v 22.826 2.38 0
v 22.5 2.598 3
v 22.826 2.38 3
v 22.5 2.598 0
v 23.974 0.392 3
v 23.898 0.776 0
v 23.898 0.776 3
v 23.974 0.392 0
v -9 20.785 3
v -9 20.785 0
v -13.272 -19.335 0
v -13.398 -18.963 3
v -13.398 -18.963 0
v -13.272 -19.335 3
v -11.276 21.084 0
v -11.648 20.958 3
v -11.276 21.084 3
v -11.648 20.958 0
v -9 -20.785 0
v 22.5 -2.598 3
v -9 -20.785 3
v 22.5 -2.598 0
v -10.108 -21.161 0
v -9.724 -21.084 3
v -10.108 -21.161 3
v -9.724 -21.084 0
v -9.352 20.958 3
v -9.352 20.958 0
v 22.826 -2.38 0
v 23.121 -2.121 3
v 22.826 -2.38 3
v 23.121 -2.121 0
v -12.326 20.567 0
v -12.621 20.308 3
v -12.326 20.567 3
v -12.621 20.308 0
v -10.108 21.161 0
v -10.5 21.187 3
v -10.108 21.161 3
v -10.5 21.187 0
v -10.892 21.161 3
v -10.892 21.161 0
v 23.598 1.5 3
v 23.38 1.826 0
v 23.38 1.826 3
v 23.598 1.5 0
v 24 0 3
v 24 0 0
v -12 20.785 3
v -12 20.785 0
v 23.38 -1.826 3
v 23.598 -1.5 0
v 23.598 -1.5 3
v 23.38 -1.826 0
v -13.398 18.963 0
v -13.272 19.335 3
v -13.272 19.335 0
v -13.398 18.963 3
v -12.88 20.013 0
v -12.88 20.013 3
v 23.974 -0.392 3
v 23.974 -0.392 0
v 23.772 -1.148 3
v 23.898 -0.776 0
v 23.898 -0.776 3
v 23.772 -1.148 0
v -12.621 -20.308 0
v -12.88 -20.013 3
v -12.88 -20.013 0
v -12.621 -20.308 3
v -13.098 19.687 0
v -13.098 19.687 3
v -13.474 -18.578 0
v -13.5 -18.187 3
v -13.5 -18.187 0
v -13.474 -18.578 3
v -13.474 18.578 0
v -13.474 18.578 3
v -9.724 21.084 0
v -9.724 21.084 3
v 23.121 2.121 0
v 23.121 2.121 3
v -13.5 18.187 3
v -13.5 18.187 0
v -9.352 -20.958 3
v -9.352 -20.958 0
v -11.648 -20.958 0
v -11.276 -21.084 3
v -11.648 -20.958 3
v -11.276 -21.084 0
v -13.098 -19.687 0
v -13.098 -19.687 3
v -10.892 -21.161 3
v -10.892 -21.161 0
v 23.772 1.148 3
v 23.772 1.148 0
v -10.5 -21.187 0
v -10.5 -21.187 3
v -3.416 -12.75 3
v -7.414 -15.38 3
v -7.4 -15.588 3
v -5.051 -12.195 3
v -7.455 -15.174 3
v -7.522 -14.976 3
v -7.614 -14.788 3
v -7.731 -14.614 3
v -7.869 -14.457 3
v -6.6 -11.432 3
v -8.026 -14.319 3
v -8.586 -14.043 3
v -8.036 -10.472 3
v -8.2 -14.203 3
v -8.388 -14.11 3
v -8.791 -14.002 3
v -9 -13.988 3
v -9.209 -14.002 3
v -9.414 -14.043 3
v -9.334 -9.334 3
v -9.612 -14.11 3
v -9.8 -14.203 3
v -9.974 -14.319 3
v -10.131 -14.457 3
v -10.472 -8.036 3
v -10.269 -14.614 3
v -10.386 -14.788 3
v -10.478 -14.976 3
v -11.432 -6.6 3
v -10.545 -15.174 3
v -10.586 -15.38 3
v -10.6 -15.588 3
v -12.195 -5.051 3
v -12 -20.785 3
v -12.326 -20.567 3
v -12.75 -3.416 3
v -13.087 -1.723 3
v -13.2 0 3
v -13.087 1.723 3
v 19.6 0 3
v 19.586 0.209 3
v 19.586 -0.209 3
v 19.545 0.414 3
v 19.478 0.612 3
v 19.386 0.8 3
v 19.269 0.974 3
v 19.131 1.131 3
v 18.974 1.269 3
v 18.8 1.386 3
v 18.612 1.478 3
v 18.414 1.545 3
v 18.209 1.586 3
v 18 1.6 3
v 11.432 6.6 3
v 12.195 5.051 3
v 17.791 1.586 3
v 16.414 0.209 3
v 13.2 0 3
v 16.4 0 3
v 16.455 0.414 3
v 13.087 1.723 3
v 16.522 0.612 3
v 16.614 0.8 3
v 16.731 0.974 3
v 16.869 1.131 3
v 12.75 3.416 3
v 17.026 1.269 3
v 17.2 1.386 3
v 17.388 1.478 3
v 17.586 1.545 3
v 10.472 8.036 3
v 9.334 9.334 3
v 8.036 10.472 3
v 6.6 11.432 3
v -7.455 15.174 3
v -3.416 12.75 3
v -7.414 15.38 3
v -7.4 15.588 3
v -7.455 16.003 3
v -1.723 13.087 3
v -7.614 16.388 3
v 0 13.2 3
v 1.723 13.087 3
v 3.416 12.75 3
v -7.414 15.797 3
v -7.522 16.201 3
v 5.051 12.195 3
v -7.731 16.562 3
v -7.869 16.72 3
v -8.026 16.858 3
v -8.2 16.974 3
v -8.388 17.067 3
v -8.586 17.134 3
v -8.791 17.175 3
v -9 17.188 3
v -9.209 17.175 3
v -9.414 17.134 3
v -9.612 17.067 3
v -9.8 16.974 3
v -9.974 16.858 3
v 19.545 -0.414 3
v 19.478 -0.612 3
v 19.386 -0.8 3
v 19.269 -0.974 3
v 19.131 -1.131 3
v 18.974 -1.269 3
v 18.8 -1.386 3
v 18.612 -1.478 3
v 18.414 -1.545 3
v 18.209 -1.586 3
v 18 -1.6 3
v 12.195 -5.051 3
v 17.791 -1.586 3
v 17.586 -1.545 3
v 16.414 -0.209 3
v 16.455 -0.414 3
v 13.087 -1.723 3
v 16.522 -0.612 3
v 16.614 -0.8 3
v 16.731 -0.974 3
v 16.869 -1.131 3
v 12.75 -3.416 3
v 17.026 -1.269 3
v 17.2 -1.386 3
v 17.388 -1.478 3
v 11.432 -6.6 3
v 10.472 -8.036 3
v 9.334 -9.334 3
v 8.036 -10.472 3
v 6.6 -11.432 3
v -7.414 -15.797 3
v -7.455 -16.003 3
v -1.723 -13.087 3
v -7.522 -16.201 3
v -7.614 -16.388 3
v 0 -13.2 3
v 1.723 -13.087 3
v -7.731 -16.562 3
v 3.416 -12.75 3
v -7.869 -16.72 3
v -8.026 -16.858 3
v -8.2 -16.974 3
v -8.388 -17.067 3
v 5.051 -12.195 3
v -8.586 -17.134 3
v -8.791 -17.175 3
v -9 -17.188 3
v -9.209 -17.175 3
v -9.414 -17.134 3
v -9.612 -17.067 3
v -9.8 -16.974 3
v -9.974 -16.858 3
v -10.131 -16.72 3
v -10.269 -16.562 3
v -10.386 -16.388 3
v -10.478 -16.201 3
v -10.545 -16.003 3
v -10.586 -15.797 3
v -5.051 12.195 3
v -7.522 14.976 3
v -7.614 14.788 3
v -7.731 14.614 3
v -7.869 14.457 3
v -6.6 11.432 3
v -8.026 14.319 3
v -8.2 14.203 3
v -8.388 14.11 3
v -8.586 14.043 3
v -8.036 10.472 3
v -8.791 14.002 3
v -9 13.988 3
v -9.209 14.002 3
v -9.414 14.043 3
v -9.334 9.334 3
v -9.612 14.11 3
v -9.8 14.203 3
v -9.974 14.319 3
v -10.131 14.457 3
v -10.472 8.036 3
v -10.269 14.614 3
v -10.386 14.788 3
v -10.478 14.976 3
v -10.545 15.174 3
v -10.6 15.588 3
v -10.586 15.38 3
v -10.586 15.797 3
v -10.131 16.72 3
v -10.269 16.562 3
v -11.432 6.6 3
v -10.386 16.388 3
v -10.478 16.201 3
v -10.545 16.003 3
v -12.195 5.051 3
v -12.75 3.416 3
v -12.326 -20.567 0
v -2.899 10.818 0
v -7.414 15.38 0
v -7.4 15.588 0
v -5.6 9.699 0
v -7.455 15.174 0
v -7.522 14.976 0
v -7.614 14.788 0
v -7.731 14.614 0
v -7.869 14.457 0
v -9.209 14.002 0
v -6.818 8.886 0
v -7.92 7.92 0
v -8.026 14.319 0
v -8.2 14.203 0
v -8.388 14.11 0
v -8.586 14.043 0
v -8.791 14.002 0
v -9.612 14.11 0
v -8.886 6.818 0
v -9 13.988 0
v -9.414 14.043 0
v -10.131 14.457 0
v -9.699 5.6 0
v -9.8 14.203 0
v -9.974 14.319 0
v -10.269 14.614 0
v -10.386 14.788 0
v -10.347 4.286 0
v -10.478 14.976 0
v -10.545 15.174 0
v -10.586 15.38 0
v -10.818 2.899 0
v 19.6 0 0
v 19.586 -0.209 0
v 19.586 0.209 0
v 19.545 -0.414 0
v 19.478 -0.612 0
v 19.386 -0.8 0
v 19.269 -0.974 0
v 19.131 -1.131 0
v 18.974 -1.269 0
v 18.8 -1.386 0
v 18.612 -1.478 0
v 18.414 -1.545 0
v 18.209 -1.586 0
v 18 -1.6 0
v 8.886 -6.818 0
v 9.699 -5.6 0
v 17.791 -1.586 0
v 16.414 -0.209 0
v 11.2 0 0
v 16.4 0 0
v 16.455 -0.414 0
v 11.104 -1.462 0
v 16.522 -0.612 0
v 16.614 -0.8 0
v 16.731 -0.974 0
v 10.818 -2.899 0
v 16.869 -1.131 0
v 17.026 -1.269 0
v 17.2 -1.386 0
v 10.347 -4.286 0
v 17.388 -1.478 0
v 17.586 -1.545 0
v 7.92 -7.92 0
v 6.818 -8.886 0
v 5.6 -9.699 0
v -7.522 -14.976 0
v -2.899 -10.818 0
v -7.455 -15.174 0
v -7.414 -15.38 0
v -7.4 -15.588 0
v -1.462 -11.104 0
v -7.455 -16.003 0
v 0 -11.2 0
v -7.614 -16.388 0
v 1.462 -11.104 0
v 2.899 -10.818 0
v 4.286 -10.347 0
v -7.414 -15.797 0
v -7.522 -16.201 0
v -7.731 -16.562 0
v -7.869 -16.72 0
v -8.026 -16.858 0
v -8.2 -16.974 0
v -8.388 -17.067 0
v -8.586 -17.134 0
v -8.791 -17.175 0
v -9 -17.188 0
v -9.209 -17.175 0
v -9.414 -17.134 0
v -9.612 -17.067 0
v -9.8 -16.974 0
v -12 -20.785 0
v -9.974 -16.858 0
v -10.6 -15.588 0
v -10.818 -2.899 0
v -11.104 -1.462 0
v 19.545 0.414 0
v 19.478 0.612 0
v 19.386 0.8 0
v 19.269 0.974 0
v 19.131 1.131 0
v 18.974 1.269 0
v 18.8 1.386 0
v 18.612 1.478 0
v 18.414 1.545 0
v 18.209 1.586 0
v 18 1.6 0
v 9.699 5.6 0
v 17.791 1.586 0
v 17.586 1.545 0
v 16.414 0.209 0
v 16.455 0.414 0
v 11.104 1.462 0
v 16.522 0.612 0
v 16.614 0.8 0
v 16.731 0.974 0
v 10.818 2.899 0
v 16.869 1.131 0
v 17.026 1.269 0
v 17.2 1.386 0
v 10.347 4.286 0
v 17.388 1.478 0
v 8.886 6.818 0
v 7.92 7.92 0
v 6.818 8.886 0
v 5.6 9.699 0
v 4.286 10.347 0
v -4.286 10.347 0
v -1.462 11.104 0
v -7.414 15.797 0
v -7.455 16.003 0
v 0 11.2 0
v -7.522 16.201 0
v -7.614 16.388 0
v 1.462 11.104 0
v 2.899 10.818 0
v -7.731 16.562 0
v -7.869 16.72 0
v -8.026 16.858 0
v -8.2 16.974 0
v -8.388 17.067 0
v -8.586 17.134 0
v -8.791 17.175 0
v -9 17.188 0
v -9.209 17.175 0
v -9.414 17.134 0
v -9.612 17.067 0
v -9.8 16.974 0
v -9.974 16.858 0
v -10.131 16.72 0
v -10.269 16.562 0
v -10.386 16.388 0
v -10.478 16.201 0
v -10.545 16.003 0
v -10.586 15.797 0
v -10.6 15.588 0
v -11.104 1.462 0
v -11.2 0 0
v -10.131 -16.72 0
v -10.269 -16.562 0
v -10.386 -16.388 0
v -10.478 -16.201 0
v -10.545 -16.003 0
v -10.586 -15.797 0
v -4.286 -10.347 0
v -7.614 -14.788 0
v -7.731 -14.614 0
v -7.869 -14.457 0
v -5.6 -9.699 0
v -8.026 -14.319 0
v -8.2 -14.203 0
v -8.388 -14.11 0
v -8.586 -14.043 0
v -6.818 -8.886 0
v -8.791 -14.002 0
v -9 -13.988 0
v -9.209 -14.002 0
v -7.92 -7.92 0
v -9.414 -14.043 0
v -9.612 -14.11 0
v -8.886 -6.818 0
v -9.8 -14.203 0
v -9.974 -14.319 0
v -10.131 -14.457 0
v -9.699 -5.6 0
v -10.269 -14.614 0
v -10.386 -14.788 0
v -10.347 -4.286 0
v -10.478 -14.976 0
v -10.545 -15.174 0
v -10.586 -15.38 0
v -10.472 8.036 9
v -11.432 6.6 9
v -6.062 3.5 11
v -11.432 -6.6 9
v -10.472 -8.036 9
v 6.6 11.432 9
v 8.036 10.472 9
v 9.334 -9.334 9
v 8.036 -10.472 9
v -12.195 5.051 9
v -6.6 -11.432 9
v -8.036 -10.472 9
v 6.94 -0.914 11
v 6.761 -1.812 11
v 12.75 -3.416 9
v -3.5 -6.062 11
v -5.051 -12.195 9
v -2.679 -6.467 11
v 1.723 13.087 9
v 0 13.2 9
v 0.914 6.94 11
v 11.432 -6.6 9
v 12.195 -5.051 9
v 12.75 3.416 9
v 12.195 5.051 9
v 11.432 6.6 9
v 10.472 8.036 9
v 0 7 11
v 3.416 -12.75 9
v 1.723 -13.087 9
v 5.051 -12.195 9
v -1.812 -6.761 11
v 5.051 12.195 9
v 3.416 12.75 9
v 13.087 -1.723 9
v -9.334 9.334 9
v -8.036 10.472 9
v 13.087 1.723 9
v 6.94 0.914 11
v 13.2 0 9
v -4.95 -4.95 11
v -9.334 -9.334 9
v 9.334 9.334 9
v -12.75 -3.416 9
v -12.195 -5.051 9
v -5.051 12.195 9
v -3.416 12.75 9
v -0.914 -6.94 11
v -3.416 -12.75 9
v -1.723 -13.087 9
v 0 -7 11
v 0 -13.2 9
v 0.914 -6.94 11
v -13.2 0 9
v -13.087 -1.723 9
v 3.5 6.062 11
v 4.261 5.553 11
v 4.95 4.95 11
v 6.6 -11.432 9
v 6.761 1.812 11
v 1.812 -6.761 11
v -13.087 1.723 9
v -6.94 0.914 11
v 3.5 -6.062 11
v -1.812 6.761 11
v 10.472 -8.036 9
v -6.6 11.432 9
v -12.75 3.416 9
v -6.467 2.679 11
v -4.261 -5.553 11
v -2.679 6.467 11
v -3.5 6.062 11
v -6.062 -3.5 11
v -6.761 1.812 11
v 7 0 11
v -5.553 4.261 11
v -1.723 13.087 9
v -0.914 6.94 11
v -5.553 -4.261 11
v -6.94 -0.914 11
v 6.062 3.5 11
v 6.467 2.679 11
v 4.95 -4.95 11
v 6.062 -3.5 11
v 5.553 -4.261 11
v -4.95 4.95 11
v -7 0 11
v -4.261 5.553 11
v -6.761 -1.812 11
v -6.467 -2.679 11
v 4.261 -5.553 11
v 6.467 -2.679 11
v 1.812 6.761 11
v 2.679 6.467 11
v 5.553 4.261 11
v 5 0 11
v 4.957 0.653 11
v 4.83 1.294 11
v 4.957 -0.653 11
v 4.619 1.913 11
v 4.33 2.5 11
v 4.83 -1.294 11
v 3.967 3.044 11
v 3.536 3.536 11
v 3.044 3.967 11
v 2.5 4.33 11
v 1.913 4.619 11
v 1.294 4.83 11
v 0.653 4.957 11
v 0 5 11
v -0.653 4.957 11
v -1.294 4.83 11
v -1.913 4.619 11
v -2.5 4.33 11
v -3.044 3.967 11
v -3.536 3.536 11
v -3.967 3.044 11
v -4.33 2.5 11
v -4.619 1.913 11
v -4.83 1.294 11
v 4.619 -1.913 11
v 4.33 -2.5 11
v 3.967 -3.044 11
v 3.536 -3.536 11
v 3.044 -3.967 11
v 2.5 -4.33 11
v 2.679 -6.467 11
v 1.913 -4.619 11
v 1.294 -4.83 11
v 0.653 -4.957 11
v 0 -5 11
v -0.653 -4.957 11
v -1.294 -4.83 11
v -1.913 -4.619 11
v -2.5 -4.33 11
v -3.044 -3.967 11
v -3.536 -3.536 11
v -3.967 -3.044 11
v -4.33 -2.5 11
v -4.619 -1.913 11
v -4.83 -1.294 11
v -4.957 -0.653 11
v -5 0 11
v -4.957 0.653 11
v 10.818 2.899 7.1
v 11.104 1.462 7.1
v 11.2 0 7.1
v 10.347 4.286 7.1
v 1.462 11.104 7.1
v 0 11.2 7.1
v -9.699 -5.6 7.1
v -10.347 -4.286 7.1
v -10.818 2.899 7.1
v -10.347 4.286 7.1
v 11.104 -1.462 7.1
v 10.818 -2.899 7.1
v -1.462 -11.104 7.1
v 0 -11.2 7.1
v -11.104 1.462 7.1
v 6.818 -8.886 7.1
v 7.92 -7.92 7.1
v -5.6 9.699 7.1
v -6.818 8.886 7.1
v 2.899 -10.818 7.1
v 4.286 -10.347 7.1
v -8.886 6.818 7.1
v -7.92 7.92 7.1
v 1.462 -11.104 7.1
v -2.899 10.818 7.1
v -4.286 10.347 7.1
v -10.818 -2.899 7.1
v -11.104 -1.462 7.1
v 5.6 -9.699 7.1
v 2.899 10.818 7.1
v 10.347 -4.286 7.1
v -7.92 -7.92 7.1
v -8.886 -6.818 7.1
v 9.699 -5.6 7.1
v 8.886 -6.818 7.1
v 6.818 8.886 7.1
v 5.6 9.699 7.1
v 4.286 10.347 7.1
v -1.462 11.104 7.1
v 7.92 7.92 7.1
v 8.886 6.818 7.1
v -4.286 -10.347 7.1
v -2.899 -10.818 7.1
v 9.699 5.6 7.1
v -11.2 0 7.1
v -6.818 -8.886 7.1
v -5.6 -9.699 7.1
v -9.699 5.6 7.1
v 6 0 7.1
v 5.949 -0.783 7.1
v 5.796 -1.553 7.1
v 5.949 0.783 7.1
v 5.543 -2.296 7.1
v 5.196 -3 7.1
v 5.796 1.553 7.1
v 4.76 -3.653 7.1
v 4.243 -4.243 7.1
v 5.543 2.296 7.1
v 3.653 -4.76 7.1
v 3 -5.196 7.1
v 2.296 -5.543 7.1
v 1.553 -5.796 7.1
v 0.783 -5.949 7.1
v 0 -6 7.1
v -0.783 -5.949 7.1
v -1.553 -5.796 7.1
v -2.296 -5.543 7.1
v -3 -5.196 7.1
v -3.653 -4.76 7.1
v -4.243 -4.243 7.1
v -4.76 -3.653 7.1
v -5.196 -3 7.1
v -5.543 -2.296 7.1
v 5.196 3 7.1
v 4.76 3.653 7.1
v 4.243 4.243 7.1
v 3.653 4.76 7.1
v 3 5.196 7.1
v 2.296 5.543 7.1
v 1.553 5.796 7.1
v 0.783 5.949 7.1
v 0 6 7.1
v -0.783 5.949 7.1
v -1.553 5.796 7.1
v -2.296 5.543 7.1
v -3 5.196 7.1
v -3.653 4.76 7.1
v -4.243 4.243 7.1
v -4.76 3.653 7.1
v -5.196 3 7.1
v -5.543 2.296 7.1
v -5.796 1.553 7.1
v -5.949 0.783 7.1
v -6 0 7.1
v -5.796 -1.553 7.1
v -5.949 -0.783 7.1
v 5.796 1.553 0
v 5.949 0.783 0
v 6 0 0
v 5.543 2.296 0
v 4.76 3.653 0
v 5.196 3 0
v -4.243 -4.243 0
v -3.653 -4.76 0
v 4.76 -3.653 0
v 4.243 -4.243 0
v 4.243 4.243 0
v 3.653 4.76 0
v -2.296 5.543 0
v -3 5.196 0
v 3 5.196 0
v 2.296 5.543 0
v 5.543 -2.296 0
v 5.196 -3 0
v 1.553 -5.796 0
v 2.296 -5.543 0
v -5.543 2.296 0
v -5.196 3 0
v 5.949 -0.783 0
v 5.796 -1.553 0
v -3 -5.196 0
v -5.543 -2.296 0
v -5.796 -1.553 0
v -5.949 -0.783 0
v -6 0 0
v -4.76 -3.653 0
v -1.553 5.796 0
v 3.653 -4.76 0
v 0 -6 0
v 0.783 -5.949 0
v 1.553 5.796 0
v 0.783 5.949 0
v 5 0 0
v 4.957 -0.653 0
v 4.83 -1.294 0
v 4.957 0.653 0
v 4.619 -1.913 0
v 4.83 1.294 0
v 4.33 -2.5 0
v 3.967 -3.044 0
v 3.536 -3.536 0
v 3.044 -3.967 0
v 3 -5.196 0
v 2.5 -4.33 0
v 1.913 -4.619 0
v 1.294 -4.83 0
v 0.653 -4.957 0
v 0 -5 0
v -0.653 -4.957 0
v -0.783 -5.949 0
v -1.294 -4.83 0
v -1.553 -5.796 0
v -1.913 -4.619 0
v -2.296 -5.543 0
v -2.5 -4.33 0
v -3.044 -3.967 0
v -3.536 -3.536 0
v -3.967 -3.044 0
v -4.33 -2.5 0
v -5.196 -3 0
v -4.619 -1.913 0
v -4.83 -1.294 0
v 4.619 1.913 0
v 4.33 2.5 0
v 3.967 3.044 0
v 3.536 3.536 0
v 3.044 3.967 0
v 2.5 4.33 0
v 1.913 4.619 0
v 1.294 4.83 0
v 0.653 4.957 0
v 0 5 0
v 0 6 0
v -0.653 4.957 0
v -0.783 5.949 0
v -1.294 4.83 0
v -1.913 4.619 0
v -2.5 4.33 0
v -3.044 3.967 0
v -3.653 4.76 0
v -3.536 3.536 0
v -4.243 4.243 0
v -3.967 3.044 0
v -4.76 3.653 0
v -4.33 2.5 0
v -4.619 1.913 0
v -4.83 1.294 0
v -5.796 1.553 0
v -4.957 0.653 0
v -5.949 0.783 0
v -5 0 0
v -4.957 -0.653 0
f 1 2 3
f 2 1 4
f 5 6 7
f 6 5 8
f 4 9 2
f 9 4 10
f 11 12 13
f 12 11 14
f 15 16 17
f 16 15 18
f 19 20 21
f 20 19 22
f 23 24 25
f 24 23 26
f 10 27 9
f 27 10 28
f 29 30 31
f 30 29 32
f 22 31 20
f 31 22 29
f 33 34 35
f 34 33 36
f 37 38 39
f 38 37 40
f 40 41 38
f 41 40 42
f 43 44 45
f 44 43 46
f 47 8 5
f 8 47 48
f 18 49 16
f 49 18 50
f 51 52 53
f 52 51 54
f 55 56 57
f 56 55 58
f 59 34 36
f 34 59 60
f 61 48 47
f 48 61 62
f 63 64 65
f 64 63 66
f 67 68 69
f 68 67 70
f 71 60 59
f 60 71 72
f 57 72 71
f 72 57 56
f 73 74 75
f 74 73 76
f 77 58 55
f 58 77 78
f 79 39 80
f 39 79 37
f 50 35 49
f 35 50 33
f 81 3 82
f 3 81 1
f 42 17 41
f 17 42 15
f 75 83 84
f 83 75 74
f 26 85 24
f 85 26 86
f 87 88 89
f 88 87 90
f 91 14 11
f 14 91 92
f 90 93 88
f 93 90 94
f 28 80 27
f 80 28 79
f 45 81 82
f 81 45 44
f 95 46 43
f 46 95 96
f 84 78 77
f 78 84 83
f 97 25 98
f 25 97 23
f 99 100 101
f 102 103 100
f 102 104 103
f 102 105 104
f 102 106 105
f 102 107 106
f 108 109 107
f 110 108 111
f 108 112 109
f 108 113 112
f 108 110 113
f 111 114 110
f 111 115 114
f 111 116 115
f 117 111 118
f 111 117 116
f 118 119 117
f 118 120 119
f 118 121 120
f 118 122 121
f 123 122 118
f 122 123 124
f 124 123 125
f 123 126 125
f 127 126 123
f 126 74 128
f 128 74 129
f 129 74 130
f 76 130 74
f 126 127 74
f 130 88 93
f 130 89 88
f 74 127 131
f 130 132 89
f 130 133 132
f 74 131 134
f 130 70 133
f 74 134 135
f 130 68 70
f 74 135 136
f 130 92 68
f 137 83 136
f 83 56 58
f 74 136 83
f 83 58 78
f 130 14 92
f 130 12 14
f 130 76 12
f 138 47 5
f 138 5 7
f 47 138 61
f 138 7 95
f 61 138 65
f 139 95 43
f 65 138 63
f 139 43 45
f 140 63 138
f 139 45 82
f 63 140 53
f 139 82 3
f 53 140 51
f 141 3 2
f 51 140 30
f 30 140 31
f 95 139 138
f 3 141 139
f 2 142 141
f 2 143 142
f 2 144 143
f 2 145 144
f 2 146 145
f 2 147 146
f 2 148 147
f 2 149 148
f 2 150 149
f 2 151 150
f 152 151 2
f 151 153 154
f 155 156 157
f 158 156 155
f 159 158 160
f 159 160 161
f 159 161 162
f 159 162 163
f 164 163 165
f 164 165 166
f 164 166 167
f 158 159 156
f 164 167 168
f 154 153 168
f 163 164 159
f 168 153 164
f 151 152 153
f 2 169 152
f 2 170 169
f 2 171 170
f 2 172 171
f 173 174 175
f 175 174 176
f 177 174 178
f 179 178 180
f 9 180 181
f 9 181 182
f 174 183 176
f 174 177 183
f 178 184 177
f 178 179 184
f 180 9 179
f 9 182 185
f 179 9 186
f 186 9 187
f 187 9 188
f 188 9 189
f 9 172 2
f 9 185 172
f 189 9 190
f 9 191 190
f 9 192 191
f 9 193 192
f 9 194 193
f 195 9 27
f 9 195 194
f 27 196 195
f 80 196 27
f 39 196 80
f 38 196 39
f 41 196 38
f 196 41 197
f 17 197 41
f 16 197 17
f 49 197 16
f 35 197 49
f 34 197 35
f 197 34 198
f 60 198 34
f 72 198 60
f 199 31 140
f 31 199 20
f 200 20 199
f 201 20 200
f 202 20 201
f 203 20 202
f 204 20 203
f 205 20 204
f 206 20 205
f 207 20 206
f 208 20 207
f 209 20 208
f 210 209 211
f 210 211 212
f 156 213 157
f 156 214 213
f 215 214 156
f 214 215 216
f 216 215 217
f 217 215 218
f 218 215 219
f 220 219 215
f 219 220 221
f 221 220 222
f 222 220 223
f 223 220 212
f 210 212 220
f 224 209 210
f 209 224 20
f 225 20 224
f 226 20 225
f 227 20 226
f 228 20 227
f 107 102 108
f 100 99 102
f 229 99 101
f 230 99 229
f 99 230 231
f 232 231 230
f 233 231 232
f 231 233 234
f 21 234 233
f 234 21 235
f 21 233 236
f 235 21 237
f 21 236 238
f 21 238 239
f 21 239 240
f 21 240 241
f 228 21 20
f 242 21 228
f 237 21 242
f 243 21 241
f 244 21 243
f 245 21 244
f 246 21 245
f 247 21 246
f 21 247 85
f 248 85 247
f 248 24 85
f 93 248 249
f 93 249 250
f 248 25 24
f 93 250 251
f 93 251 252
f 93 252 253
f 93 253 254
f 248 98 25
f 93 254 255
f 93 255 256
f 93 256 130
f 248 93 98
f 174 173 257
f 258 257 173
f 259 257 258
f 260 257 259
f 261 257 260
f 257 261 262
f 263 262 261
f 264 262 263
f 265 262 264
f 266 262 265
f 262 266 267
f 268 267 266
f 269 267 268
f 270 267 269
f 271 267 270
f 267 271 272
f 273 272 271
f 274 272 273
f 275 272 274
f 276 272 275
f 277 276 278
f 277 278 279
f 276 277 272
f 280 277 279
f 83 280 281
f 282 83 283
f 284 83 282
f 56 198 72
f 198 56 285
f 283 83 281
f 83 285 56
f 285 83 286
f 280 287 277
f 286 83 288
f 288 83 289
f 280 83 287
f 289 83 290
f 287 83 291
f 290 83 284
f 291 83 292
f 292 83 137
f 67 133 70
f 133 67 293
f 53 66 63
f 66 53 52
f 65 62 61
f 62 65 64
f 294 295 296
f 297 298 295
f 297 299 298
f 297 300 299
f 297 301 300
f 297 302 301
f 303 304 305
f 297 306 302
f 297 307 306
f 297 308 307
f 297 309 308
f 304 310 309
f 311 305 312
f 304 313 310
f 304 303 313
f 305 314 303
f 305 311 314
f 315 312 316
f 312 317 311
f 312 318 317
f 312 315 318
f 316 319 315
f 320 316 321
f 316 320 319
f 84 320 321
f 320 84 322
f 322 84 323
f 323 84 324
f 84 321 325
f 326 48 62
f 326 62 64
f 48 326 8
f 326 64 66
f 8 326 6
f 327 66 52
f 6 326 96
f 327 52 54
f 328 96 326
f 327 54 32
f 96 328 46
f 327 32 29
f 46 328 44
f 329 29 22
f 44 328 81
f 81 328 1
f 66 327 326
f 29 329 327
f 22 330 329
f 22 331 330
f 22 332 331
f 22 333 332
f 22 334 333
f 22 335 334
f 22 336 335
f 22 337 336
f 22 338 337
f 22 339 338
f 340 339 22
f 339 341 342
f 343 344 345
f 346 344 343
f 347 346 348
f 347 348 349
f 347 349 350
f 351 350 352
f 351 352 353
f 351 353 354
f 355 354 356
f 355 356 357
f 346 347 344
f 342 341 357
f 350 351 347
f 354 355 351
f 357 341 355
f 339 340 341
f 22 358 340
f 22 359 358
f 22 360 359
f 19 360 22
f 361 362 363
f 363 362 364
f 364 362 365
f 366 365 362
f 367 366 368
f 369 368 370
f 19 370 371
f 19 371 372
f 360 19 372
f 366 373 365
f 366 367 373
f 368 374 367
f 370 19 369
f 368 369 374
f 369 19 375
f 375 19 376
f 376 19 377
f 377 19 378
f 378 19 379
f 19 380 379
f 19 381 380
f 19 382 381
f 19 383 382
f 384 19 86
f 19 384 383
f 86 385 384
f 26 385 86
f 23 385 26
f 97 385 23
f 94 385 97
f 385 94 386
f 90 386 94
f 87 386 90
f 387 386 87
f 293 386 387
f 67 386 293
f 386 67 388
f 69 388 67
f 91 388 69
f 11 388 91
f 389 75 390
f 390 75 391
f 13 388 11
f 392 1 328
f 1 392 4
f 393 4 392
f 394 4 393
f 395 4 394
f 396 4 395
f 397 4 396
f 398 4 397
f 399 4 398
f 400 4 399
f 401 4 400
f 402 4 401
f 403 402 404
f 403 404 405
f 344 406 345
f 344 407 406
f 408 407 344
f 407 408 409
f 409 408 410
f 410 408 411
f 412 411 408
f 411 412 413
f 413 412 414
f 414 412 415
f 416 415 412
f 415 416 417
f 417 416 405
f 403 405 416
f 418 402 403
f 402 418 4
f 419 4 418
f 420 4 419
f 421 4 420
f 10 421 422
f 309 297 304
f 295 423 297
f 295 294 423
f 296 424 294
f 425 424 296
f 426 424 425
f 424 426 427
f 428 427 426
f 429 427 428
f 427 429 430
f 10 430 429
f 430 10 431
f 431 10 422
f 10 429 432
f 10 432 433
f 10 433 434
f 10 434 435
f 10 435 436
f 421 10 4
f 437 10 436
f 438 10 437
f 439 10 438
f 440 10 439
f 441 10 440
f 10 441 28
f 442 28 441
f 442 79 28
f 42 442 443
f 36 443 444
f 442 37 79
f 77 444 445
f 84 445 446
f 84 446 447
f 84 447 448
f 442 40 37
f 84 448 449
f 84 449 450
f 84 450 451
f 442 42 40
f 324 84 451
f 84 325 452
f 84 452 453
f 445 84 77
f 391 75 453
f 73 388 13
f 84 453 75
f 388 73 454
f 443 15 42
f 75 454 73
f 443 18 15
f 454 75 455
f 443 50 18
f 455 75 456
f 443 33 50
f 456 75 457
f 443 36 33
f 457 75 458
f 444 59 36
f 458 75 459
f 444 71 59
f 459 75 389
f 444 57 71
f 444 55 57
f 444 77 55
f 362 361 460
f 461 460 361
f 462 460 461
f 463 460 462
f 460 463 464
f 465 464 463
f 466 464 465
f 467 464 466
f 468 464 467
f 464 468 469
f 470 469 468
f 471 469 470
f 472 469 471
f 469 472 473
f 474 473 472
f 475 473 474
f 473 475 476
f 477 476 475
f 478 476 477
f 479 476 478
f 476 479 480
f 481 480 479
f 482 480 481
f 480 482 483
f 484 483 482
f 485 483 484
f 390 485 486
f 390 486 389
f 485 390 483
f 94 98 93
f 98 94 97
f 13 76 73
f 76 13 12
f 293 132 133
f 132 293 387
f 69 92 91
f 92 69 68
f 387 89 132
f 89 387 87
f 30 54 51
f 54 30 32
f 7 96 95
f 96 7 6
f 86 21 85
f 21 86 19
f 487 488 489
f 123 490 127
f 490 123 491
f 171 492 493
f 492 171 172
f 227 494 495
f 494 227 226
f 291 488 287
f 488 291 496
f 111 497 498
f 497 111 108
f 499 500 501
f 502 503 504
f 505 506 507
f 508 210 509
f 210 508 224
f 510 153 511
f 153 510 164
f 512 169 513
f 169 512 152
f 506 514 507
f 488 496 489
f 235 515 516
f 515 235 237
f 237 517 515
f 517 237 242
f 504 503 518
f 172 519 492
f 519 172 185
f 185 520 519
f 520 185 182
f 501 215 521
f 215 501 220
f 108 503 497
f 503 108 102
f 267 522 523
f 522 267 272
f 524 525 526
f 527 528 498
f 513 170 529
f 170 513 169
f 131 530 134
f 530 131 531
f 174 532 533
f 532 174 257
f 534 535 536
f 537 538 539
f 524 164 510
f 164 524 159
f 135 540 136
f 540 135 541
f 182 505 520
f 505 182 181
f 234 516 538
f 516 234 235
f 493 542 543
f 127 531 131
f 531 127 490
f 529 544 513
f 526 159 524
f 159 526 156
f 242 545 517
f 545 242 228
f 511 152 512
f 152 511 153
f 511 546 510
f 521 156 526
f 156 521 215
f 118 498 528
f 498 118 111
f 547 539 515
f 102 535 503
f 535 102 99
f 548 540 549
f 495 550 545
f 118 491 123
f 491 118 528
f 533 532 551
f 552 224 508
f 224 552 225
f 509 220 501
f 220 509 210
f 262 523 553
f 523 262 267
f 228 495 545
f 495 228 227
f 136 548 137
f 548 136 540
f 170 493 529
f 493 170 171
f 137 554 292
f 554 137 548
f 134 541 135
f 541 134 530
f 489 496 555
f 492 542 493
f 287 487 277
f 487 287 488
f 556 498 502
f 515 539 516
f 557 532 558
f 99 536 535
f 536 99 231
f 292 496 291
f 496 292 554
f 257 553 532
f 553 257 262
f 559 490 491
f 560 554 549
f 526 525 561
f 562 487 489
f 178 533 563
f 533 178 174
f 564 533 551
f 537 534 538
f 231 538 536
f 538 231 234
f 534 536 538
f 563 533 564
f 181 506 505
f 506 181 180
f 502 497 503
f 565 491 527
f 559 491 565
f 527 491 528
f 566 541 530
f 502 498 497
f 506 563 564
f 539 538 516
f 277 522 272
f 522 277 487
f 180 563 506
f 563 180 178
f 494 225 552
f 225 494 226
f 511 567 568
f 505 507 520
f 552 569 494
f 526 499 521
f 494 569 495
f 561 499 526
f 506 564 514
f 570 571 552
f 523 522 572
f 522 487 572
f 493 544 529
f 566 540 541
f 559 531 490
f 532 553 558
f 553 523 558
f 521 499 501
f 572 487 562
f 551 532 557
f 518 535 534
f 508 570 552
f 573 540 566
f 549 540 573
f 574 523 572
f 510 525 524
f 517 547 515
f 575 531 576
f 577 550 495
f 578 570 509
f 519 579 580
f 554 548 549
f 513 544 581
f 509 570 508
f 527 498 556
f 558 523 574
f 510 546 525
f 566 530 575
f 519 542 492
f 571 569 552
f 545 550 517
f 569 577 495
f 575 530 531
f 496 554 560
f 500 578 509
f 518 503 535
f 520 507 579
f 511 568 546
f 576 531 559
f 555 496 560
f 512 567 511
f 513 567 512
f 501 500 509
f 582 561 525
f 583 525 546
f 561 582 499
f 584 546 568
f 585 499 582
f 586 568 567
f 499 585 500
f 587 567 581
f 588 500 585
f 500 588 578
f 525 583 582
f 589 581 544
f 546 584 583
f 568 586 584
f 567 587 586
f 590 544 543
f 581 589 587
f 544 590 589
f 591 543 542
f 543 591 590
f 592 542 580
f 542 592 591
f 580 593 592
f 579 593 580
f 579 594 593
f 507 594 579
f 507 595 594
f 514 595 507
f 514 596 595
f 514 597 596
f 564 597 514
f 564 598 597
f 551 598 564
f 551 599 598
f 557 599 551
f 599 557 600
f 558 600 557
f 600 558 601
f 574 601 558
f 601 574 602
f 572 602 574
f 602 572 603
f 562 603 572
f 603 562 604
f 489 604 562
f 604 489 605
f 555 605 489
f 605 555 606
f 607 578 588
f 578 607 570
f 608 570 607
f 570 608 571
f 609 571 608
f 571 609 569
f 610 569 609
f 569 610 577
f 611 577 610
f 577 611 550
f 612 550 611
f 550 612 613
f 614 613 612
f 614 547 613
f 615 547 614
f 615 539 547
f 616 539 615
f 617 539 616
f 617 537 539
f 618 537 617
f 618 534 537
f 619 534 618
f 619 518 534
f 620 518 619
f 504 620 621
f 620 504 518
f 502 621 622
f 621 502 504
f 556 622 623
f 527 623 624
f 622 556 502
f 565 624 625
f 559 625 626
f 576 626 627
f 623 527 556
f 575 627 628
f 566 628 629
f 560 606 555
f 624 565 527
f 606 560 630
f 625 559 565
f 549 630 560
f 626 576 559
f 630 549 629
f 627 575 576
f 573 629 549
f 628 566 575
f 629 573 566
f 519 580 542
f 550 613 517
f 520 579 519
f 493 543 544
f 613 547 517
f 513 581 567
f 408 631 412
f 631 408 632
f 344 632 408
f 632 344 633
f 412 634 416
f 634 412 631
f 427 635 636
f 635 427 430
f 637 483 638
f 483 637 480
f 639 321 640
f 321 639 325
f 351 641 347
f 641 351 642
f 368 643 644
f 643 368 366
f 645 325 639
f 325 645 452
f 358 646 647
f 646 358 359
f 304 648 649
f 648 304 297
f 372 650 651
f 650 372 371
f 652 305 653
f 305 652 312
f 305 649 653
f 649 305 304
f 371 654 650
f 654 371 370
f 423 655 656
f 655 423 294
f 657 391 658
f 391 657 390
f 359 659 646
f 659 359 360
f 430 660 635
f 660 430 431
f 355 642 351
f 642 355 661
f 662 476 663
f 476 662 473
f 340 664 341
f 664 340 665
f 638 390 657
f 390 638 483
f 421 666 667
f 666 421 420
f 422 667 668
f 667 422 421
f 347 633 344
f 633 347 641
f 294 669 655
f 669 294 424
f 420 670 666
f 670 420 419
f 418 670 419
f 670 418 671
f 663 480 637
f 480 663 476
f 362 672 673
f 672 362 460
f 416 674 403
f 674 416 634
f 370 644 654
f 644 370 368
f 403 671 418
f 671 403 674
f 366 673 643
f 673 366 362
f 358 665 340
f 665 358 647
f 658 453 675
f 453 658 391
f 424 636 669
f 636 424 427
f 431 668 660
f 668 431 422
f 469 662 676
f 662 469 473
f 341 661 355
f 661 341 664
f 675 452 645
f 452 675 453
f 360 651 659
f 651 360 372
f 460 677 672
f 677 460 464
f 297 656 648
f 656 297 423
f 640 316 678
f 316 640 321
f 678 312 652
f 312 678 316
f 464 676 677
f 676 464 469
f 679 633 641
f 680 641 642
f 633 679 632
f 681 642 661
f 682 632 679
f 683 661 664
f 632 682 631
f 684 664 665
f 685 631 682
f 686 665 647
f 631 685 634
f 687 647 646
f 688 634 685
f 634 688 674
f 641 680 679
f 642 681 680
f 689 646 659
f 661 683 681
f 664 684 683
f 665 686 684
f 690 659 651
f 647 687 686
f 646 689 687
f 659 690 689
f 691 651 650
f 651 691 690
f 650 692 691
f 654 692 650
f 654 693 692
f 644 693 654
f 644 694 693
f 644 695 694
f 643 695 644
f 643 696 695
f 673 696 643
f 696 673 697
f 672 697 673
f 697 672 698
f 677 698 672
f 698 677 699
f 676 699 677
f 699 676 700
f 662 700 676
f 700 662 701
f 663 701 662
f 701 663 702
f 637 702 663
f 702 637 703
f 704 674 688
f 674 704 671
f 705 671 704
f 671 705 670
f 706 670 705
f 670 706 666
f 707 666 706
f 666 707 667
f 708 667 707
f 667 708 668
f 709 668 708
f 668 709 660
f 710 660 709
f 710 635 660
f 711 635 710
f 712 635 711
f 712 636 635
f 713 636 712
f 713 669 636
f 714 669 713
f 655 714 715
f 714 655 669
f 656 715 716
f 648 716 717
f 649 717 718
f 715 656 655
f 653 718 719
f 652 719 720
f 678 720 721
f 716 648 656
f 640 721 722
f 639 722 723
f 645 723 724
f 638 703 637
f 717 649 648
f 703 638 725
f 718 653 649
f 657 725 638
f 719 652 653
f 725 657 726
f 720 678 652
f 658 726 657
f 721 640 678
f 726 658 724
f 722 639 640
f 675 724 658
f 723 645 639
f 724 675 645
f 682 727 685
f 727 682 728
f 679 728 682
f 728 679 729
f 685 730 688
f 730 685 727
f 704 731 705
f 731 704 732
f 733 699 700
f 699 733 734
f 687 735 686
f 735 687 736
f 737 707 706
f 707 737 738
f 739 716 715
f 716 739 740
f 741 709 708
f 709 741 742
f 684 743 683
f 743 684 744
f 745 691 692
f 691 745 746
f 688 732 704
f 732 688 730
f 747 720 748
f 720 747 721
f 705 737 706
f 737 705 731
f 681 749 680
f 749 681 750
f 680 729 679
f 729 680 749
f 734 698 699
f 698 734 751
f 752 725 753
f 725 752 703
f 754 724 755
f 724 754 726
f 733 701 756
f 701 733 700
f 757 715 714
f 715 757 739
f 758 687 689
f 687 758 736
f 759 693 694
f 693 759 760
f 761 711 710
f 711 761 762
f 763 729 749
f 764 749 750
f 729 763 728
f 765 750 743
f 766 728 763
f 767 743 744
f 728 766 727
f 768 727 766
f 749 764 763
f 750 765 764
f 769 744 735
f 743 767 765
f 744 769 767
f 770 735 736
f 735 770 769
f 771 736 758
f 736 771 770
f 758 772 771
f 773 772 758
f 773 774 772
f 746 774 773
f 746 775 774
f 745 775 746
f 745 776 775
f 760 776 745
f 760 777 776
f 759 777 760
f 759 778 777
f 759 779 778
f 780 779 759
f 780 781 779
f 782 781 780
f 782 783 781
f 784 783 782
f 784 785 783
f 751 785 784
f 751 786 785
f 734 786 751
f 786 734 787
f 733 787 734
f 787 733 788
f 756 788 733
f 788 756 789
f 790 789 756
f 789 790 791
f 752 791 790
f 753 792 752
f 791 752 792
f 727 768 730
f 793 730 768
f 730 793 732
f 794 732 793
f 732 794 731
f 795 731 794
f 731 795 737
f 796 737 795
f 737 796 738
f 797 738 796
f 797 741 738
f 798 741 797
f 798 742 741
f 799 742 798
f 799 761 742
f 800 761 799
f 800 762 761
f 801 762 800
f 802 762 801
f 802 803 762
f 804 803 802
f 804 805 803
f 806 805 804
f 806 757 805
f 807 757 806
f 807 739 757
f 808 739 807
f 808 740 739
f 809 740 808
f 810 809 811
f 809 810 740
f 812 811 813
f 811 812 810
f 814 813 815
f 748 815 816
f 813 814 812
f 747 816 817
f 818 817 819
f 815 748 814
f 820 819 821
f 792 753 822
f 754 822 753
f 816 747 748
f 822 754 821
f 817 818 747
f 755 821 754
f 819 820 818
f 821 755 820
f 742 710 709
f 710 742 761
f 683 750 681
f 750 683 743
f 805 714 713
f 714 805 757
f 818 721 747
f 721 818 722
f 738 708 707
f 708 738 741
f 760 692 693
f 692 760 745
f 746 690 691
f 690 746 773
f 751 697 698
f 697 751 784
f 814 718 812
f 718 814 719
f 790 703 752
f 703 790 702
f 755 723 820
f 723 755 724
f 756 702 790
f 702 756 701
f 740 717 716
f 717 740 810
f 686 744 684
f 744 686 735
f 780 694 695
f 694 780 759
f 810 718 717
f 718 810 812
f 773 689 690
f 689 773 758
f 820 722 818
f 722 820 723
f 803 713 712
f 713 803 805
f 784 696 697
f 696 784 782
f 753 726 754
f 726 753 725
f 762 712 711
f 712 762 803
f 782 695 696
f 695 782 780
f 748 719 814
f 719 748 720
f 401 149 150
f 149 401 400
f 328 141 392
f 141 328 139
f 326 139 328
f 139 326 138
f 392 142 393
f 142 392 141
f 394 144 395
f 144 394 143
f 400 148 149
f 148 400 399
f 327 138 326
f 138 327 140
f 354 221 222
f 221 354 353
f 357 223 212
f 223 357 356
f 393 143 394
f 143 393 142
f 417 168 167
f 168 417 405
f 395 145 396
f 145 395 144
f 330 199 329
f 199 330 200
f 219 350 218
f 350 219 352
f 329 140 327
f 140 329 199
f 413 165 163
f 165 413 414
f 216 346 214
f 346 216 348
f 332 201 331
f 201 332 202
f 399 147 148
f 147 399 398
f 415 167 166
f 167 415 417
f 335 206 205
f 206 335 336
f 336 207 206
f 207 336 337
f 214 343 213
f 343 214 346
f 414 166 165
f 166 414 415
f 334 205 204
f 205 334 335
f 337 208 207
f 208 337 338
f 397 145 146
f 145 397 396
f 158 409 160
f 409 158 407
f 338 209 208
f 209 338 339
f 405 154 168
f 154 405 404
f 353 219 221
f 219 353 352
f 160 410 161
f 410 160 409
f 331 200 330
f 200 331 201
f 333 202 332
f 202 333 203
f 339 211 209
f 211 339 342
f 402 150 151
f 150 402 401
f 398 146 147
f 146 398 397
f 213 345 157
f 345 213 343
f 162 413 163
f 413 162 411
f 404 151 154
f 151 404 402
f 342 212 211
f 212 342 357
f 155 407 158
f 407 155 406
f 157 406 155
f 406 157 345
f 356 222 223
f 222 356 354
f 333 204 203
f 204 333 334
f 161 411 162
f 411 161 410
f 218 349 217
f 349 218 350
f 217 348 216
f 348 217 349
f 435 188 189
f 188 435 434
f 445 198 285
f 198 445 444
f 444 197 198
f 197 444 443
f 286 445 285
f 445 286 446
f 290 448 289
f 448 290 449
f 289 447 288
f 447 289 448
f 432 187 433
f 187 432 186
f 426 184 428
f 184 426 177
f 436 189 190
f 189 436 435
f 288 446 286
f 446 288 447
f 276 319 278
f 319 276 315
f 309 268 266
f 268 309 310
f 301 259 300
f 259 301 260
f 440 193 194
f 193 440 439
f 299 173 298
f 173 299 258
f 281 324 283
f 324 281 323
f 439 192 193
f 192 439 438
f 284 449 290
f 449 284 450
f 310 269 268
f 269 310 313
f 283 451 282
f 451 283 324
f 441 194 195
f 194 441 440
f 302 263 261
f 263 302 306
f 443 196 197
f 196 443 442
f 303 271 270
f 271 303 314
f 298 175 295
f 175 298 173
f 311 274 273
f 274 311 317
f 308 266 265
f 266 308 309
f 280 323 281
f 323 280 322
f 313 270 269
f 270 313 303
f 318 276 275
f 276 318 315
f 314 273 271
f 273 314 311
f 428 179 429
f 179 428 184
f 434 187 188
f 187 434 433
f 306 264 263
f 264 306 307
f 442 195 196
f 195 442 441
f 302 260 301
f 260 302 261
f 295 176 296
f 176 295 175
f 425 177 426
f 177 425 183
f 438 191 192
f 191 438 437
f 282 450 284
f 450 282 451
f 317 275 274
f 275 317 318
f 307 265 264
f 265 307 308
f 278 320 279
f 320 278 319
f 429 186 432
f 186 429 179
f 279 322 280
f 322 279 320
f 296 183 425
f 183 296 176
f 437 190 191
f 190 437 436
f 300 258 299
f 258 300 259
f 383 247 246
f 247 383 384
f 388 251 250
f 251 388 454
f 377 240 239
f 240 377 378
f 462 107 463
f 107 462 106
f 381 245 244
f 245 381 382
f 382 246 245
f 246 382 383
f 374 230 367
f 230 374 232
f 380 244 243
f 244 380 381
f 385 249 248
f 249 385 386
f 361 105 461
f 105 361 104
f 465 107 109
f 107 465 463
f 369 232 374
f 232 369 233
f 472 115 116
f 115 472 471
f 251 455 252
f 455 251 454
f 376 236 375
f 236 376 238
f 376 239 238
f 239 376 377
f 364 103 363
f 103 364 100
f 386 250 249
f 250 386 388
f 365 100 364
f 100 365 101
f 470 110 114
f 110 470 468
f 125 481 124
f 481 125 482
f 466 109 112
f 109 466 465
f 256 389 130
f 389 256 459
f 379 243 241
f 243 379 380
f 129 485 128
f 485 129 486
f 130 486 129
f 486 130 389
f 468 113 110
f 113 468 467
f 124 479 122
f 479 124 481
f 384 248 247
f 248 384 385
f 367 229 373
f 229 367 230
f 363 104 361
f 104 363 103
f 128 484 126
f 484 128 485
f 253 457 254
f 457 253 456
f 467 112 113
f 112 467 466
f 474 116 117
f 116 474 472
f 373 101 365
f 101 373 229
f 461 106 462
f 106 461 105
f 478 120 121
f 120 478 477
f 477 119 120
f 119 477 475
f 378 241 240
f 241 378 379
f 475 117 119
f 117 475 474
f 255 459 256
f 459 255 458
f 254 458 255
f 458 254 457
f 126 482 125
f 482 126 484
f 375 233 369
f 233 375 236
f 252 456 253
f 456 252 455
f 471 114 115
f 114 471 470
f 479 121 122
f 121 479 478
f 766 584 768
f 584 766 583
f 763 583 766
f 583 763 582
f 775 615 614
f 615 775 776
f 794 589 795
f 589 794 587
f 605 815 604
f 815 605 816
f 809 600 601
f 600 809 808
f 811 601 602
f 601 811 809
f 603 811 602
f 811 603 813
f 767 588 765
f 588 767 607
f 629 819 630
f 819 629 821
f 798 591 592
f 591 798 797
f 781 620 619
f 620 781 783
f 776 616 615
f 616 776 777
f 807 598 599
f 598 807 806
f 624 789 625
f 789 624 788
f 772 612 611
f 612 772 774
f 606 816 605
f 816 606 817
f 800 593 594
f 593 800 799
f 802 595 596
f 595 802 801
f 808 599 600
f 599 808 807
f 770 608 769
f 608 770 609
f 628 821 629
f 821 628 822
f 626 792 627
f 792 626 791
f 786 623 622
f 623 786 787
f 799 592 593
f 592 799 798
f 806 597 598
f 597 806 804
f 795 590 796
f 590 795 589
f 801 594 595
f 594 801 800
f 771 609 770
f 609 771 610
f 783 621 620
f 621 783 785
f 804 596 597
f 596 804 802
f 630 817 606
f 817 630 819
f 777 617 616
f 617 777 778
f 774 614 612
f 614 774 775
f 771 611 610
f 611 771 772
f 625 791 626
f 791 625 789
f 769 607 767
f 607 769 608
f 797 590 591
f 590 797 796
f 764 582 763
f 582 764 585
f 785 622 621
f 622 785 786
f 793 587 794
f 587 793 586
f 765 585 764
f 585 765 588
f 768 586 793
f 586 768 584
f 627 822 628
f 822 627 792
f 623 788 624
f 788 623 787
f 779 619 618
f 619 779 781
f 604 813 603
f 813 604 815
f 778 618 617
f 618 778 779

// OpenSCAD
//number of sides of the holder plate
NumberOfSides = 3;
//dimension of the bearing outer dimension
DiameterOfBearing = 22;
//dimension of the bearing height
HeightOfBearing = 7;
//dimension of the bearing inner dimension
InnerDiameterBearing = 10;
//Screw holes diameter to fixen the holder
ScrewHoles = 3.2;

$fn=48;
difference(){
union(){
difference()
{
union(){
hull(){
//Generate the base plate
for (i=[0:NumberOfSides-1])
{
rotate([0,0,(360/NumberOfSides)*i])translate([DiameterOfBearing/2+10,0,0])cylinder(r=3,h=3);
}
}
hull(){
cylinder(r=DiameterOfBearing/2+0.2+2, h=HeightOfBearing+2);
translate([0,0,HeightOfBearing+2])cylinder(r=InnerDiameterBearing/2+2, h=2);
}
}
//space holder for the Bearing
cylinder(r=DiameterOfBearing/2+0.2, h=HeightOfBearing+0.1);
}
//inner support for the bearing roof
cylinder(r=InnerDiameterBearing/2+1,h = HeightOfBearing + 2);
}
//the inner hole
cylinder(r=InnerDiameterBearing/2,h = HeightOfBearing + 6);

//generate the fixing holes
for (i=[0:NumberOfSides-1])
{
rotate([0,0,(360/NumberOfSides)*i])translate([DiameterOfBearing/2+7,0,0])cylinder(r=ScrewHoles/2,h=3);
}
}
